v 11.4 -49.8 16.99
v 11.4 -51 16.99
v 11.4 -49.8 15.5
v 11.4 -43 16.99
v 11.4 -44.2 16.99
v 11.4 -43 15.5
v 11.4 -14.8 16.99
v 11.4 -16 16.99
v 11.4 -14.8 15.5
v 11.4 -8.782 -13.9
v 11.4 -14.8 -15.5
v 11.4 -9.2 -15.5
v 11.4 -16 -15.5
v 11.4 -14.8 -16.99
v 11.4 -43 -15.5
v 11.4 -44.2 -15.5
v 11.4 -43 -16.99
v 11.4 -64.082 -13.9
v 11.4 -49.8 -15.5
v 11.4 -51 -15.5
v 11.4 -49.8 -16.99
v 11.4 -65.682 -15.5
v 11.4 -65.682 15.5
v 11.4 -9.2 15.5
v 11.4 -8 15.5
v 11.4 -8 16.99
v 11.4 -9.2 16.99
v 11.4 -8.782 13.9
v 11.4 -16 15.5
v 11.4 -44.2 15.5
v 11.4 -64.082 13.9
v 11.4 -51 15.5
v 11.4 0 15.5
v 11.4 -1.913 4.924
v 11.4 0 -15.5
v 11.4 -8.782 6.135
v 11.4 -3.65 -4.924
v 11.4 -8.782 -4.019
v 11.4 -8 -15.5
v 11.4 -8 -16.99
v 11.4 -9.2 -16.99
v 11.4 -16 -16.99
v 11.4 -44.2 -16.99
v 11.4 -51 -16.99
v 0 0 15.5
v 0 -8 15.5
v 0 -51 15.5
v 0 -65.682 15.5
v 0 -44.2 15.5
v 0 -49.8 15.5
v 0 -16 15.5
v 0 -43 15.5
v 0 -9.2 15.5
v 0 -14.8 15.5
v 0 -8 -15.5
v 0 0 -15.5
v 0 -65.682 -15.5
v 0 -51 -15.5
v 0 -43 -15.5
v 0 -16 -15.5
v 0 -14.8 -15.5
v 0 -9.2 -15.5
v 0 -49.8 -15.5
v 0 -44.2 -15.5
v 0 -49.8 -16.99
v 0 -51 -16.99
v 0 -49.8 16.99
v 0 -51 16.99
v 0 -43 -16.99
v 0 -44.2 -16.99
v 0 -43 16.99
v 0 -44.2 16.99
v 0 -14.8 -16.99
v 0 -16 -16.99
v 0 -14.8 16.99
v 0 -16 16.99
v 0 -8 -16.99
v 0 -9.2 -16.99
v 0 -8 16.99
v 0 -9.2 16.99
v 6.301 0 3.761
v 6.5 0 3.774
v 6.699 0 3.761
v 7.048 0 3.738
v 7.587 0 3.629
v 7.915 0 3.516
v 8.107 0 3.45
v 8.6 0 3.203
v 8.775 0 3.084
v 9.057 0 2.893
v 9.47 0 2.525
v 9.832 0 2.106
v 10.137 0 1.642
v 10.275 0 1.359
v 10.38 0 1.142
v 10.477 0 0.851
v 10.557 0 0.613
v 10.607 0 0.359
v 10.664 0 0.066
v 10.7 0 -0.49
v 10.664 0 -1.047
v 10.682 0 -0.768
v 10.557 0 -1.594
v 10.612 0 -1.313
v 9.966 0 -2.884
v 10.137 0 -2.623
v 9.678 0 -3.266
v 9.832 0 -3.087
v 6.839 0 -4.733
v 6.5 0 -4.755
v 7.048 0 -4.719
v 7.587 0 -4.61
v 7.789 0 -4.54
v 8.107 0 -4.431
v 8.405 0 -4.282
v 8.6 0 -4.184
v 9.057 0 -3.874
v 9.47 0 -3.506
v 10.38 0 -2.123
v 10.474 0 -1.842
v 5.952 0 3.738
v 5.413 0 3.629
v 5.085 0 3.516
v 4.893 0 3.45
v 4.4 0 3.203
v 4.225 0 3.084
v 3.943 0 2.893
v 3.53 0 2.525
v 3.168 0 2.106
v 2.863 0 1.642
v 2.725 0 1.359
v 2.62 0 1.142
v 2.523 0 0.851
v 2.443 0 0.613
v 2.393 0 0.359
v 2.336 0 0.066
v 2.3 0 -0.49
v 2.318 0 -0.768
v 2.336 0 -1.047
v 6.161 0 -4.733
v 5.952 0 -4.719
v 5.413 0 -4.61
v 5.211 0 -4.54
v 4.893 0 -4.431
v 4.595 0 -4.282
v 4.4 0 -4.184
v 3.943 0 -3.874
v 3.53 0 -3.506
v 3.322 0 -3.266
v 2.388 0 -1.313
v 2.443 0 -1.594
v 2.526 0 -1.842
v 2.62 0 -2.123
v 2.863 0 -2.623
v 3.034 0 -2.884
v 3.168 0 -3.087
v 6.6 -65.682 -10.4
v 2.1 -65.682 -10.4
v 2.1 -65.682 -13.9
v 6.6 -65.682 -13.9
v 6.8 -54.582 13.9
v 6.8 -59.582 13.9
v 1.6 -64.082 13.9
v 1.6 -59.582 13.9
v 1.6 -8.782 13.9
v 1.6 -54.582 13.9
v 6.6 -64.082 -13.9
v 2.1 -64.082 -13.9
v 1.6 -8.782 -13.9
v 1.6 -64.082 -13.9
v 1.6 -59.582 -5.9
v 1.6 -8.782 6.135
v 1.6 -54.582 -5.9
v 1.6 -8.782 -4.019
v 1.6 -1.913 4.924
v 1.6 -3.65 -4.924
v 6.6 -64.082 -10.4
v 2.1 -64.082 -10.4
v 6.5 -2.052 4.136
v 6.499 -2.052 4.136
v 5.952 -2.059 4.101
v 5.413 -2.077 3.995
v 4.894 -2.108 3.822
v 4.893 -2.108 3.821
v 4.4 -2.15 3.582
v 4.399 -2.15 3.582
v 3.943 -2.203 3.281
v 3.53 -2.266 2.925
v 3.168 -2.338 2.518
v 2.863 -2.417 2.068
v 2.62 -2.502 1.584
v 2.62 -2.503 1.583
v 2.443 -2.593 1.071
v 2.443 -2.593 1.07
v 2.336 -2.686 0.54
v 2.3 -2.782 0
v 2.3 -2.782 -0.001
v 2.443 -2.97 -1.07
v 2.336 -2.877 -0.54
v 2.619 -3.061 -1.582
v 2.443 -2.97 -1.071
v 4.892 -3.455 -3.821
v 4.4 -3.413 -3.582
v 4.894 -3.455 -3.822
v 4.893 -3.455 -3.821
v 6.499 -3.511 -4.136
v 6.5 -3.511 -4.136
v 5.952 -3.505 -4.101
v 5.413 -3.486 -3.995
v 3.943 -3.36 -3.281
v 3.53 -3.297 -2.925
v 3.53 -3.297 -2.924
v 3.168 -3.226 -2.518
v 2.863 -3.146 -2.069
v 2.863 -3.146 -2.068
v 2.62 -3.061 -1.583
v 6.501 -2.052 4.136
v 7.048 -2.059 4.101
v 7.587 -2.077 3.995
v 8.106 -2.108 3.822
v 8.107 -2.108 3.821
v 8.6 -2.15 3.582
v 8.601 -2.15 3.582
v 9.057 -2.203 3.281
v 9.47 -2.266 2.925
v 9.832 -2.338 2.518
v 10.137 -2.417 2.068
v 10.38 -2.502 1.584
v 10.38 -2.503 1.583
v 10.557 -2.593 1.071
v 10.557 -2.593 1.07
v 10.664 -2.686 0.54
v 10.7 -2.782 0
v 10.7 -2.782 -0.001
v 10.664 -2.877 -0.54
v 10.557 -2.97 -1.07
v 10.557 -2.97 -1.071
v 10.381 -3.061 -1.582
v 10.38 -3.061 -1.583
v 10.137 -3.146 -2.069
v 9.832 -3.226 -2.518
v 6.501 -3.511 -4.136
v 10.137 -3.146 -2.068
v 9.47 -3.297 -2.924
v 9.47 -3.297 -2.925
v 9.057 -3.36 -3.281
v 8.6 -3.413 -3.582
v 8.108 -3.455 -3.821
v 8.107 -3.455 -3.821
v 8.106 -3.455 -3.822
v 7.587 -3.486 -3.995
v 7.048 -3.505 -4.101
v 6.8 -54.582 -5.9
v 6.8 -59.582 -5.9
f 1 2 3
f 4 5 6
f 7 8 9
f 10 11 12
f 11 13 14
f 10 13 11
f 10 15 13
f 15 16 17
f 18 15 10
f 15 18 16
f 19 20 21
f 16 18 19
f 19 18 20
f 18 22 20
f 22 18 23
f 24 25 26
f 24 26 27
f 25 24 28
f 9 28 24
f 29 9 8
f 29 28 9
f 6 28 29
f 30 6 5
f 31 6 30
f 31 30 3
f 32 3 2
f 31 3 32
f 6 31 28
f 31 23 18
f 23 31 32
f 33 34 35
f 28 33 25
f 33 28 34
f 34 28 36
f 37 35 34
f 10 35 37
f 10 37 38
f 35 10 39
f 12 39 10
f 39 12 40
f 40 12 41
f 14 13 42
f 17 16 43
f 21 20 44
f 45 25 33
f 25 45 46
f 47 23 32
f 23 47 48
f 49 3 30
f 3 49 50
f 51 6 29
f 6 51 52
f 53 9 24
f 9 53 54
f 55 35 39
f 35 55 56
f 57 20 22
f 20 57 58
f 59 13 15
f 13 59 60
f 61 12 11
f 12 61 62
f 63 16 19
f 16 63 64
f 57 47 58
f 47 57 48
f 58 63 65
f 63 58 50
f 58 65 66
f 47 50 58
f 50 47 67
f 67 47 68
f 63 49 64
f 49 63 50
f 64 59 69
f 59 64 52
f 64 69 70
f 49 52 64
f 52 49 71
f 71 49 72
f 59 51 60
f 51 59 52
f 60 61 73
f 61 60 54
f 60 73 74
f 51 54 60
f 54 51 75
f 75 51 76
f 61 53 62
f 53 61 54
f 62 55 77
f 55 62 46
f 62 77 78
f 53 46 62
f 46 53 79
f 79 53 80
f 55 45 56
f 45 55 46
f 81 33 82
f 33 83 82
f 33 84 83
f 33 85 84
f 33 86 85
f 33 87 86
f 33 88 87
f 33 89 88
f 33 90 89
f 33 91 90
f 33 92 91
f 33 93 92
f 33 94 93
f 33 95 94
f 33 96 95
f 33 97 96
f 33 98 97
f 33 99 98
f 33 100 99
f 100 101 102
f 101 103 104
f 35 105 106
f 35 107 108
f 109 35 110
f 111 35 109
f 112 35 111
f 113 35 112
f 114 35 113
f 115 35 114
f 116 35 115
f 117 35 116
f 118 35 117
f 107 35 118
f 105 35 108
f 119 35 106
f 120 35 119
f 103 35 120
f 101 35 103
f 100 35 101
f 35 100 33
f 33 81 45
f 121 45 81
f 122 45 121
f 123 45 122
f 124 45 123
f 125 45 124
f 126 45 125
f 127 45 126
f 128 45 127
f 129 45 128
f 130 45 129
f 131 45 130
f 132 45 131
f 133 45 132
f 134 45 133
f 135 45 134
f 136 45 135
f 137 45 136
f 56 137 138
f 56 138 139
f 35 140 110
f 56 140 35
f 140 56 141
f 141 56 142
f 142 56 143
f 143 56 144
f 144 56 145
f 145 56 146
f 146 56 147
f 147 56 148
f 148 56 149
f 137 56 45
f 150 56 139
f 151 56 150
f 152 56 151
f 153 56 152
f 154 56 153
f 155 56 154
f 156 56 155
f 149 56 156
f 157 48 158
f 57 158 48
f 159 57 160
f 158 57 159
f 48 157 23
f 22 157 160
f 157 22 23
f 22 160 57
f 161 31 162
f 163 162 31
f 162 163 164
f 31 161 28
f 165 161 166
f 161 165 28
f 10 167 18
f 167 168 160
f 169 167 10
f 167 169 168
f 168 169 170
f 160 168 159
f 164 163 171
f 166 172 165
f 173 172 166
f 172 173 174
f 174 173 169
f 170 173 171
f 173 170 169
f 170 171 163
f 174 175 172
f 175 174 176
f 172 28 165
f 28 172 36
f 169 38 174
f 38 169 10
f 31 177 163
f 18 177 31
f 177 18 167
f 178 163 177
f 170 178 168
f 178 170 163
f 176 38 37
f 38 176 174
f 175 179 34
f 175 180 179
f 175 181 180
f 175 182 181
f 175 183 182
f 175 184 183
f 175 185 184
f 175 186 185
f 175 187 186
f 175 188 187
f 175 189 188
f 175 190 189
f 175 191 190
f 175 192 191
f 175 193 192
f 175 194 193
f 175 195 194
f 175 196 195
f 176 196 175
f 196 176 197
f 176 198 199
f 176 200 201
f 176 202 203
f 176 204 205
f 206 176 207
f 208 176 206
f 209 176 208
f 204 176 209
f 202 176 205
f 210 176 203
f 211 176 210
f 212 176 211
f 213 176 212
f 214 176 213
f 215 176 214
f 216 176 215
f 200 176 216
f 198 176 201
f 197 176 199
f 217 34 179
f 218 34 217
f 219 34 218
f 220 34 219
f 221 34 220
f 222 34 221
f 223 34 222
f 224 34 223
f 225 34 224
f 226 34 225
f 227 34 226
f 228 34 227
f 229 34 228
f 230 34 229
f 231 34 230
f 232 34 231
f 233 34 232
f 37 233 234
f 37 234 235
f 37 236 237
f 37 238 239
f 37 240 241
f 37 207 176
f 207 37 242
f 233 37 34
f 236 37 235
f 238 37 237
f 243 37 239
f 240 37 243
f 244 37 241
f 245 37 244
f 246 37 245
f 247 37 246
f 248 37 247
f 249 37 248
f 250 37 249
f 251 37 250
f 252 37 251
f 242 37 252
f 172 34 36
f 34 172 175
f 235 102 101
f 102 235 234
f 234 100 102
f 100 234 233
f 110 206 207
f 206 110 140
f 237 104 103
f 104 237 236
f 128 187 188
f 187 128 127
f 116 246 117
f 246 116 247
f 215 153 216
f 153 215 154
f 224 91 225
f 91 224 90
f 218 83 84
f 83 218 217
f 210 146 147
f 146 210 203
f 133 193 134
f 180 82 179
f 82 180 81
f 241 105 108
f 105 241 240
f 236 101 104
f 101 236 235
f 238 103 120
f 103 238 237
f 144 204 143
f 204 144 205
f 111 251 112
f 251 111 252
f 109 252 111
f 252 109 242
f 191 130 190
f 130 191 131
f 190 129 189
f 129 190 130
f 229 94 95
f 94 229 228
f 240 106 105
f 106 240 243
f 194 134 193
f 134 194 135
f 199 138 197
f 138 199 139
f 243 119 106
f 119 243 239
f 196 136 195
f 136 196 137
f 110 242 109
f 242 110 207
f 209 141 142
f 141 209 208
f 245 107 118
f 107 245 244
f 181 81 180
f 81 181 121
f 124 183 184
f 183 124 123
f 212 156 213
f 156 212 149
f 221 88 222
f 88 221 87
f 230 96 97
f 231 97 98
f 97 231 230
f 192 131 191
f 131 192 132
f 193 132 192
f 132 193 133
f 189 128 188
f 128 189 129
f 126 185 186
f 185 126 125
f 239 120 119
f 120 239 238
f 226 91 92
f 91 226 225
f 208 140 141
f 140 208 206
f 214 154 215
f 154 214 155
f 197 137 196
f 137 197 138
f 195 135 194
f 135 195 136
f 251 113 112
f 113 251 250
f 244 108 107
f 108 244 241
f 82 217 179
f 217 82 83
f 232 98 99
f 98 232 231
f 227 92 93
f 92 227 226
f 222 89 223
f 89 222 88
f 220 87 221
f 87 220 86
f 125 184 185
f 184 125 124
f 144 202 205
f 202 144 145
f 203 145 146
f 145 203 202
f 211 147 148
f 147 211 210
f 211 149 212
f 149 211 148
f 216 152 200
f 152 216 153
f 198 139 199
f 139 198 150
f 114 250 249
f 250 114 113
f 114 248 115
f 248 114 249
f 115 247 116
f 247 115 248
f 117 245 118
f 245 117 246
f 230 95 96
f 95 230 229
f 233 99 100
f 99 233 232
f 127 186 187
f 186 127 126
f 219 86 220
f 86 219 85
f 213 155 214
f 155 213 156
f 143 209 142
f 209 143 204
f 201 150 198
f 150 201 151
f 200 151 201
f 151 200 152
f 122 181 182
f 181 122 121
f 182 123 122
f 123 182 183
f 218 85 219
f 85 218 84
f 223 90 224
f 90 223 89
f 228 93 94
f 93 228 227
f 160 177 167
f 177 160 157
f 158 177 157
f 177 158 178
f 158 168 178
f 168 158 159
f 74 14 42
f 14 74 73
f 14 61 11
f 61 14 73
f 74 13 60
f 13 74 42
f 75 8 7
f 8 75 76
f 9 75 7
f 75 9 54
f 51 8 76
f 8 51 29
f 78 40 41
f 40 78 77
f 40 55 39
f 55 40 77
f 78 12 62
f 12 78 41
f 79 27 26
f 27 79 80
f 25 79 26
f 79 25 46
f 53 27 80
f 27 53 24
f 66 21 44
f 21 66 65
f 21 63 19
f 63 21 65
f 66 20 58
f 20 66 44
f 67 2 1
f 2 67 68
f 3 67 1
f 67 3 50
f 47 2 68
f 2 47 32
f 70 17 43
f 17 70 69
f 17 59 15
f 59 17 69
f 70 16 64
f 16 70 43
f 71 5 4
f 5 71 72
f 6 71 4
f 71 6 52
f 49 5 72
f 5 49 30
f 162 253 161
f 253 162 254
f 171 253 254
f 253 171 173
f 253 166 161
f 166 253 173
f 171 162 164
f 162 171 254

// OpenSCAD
// OpenVision – clip-on USB camera mount for ordinary eyeglasses
// ---------------------------------------------------------------
// Parametric OpenSCAD model. Measure YOUR glasses' temple arm and YOUR camera,
// edit the numbers below, press F6, then File → Export → STL.
//
// Two camera styles are supported:
//   cam_type = "board" : square UVC camera board (e.g. 32×32 mm or 38×38 mm modules
//                        with an M12 lens, or small 15–25 mm boards). The board sits
//                        in a pod with a lens hole; a snap-in back lid holds it.
//   cam_type = "tube"  : cylindrical "endoscope / borescope" head (5.5 / 7 / 8 mm).
//                        Lightest option. Held in a split collar, clamped with a zip-tie.
//   cam_type = "esp32cam" : AI-Thinker ESP32-CAM (Wi-Fi, see firmware/openvision_cam). Default
//                        mount_style = "strap": no measuring, fits almost any glasses. The board lies
//                        flat against the arm in a slim box; the OV2640 camera is bent forward on
//                        its ribbon into a tilted seat behind the lens hole; a 6×6 mm push button
//                        pokes through the side lid at the back (press toward your head).
//                        strap style: two zip-ties/O-rings round box + arm also hold the lid.
//                        clip style: two snap clips (front + rear), lid glued or taped on.
//
// The mount slides onto the temple arm right behind the hinge, on the OUTSIDE.
// It snaps on (C-shaped clip with retaining lips) and can be secured with a thin
// zip-tie through the slot. The camera points forward and slightly down (tilt).
//
// Axes: +Y = forward (where you look), +Z = up, +X = away from your head (right side).
// Set side = "left" to mirror for the left temple.
//
// Print: PETG (flexes without cracking; PLA clips snap). 0.2 mm layers, 3 walls, 30 % infill.
// The "mount" part prints with the pod's outer side on the bed (already oriented by part="mount").
// The lid prints flat, lip up. No supports needed for the clip; the lens hole bridges fine.
// esp32cam: part="mount" prints upside down (box top on the bed); the 45° fillets above the clips
// make it support-free. Cut the ESP32-CAM's header pins before fitting it (program it first).

/* [What to render] */
part = "preview";        // [preview, mount, lid, cable_clip]
side = "right";          // [right, left]
cam_type = "esp32cam";   // [board, tube, esp32cam]

/* [Camera preset – modules sold in Iran (checked 2026-11). "custom" uses the Board numbers below.] */
// ov2710_38  : Aftab Rayaneh RER-USBFHD01, OV2710 1080p UVC, 38×38 mm PCB, M12 lens
//              (pick the 2.4 mm or 3.6 mm lens). The M12 holder's square base goes through
//              the front wall; the lens then screws in from the front to set focus.
// xh57_strip : Aftab Rayaneh 1 MP XH57 "laptop-webcam" strip, 35×12×4.9 mm, 71° FOV,
//              focus 15–150 cm. Lightest board option; mounted long side vertical.
// Still MEASURE your module (calipers) and check: hole spacing, holder size, lens position.
preset = "custom";       // [custom, ov2710_38, xh57_strip]
pod_dz = 0;              // move the camera pod up (+) / down (−) relative to the arm, mm

/* [Temple arm of your glasses – measure with calipers 1–2 cm behind the hinge] */
temple_t   = 3.0;   // thickness (side to side), mm
temple_h   = 6.0;   // height (top to bottom), mm
fit_tol    = 0.25;  // clearance per side; raise to 0.35 if too tight
clip_len   = 18;    // length along the arm
clip_wall  = 1.6;
lip        = 0.9;   // retaining lip under the arm (bigger = holds tighter, harder to snap on)

/* [Board camera] */
board_w    = 32;    // PCB width  (X in the pod)
board_h    = 32;    // PCB height (Z)
board_t    = 1.6;   // PCB thickness
back_space = 7;     // room behind the PCB for connector + cable bend
lens_d     = 14;    // lens barrel / holder diameter that goes through the front
lens_hole  = "round"; // [round, square]  square = for an M12 lens holder's square base
lens_sq    = 15.5;  // side of the square hole (measure the holder base, add ~0.5)
lens_dx    = 0;     // lens offset from PCB centre
lens_dz    = 0;
hole_sp_x  = 28;    // mounting-hole spacing (0 = no holes)
hole_sp_z  = 28;
hole_d     = 2.3;   // M2 clearance
pod_wall   = 1.6;
cable_w    = 4.5;   // cable slot width in the lid

/* [Tube camera] */
tube_d     = 8.0;   // head diameter
tube_len   = 14;    // how much of the head the collar grips

/* [ESP32-CAM box (cam_type = esp32cam)] */
esp_l      = 40.5;  // board length (lies along the arm, camera end forward, antenna end back)
esp_h      = 27.0;  // board height
// Defaults come from the Ai-Thinker datasheet (27 × 40.5 × 4.5 mm ±0.2) – no calipers needed.
esp_stack  = 6.5;   // 4.5 mm board + ~1 mm cut pin stubs + 1 mm foam
cam_sq     = 9.0;   // OV2640 camera module (≈8–8.5 mm; seat is generous, the module is glued)
cam_room   = 6;     // chamber in front of the board for the camera + ribbon bend
cam_dz     = 0;     // camera height relative to the box centre
esp_lens_d = 8.0;   // lens hole (OV2640 barrel ≈ 6–7.5 mm; the module is glued behind it)
btn_sq     = 6.2;   // 6×6 mm tactile switch
btn_h      = 7.0;   // switch height incl. plunger (buy 6×6×7 mm or taller)
btn_out    = 1.0;   // how far the plunger sticks out of the lid
btn_hole   = 4.0;   // hole in the lid for the plunger
btn_z      = 2;     // button height relative to the box centre
btn_room   = 14;    // chamber behind the board: button, cable strain relief, 6.3×11 mm capacitor
rear_clip  = true;  // second clip at the back end of the box
// How the box holds onto the glasses:
//   "strap": NO measuring. Two zip-ties (or silicone bands) wrap round the box AND the temple arm,
//            guided by fins on the box's top and bottom. Fits arms ~1.5–8 mm thick, 2–15 mm tall.
//            The straps also hold the lid on. Prints flat, open side up.
//   "clip" : snap-on clips sized to temple_t / temple_h (needs the arm measured).
mount_style = "strap";  // [strap, clip]
strap_w    = 5.0;   // guide gap: fits 2.5–4.8 mm zip-ties (incl. reusable ones) or a 3 mm silicone O-ring
strap_1    = 12;    // first strap, distance from the front of the box (behind the camera)
strap_2    = 47;    // second strap (in front of the button)
fin_h      = 1.5;   // guide fin height
lid_vents  = true;  // slots over the board – put the ESP32 shield side toward the lid (away from your head)

/* [Cable clips – hold the power cable along the arm, behind the ear (part = cable_clip, print 3–4)] */
cc_t       = 3.0;   // arm thickness where the clip goes (often thicker behind the ear – measure)
cc_h       = 6.0;   // arm height there
cc_len     = 6;     // clip length along the arm
cc_cable_d = 3.5;   // cable diameter

/* [Aim] */
tilt       = 10;    // degrees the camera points down (you look slightly down when walking/reading)
toe_out    = 0;     // degrees the camera turns outward (positive = away from nose)

$fn = 48;
eps = 0.01;

// preset → effective board numbers (OpenSCAD can't reassign, so presets pick values here)
P1 = preset == "ov2710_38";
P2 = preset == "xh57_strip";
bw  = P1 ? 38  : P2 ? 12  : board_w;
bh  = P1 ? 38  : P2 ? 35  : board_h;
bt  = P1 ? 1.6 : P2 ? 4.9 : board_t;
bs  = P1 ? 7   : P2 ? 3   : back_space;   // OV2710: USB header on the back; strip: soldered cable
lh  = P1 ? "square" : lens_hole;
lsq = P1 ? 15.5 : lens_sq;                // typical M12 holder base 15 mm – measure yours
ld  = P2 ? 7 : lens_d;                    // strip: small window in front of the tiny lens
ldx = lens_dx;                            // lens offset from the board centre – applies to presets too
ldz = lens_dz;                            // (strip: measure where the lens sits on YOUR module)
hsx = (P1 || P2) ? 0 : hole_sp_x;         // presets: no screws, the lid presses the board in place
hsz = (P1 || P2) ? 0 : hole_sp_z;
// With no screw holes, the lid's lip is made deep enough to press the board against the front wall.
lip_d = (hsx > 0) ? 2.2 : max(2.2, bs - 0.3);
cam_type_eff = (P1 || P2) ? "board" : cam_type;
if (P1) echo("OV2710 board: ~15 g with M12 lens. Put the mount on the arm close to the hinge; consider a counterweight on the other arm.");
if (P2) echo("XH57 strip: check where the lens sits on YOUR module and set lens_dz / pod_dz.");

// derived
tt = temple_t + 2 * fit_tol;            // slot width
th = temple_h + 2 * fit_tol;            // slot height
clip_out_x = tt + clip_wall;            // outer face of the clip
pw = bw + 0.4 + 2 * pod_wall;           // pod outer width
ph = bh + 0.4 + 2 * pod_wall;           // pod outer height
pd = pod_wall + bt + bs;                // pod outer depth

// ---------------- temple clip ----------------
// C-profile open at the bottom, extruded along Y from -clip_len to 0.
module clip(ziptie = true) {
  difference() {
    translate([-clip_wall, -clip_len, -clip_wall])
      cube([tt + 2 * clip_wall, clip_len, th + 2 * clip_wall]);
    // slot for the arm
    translate([0, -clip_len - 1, 0]) cube([tt, clip_len + 2, th]);
    // bottom opening, leaving a lip on each side
    translate([lip, -clip_len - 1, -clip_wall - 1]) cube([tt - 2 * lip, clip_len + 2, clip_wall + 2]);
    // zip-tie slot through the top, across the arm
    if (ziptie) translate([-clip_wall - 1, -clip_len * 0.65, th + clip_wall - 0.9]) cube([tt + 2 * clip_wall + 2, 3, 2]);
  }
}

// ---------------- board pod ----------------
// Local frame: front face at y = 0, pod spans x 0..pw, centred on z = 0. Open at the back.
module board_pod() {
  translate([0, -pd, -ph / 2]) difference() {
    cube([pw, pd, ph]);
    // cavity for PCB + parts behind it
    translate([pod_wall, -eps, pod_wall]) cube([pw - 2 * pod_wall, pd - pod_wall + eps, ph - 2 * pod_wall]);
    // lens hole through the front wall (round for a barrel, square for an M12 holder base)
    translate([pw / 2 + ldx, pd - pod_wall - 1, ph / 2 + ldz])
      if (lh == "square") translate([-lsq / 2, 0, -lsq / 2]) cube([lsq, pod_wall + 2, lsq]);
      else rotate([-90, 0, 0]) cylinder(d = ld + 0.4, h = pod_wall + 2);
    // M2 holes for screws from the front (nuts behind the PCB), if the board has holes
    if (hsx > 0)
      for (sx = [-1, 1], sz = [-1, 1])
        translate([pw / 2 + sx * hsx / 2, pd - pod_wall - 1, ph / 2 + sz * hsz / 2])
          rotate([-90, 0, 0]) cylinder(d = hole_d, h = pod_wall + 2);
  }
}

// Snap-in back lid: plate + inner lip that friction-fits the cavity, with a cable slot.
module board_lid() {
  cw = pw - 2 * pod_wall - 0.3;
  ch = ph - 2 * pod_wall - 0.3;
  difference() {
    union() {
      cube([pw, ph, 1.4]);                                              // plate (prints flat)
      translate([(pw - cw) / 2, (ph - ch) / 2, 1.4]) difference() {     // lip ring
        cube([cw, ch, lip_d]);
        translate([1.2, 1.2, -eps]) cube([cw - 2.4, ch - 2.4, lip_d + 2 * eps]);
      }
    }
    // cable slot from the centre to the bottom edge, so the lid goes on over the cable
    translate([pw / 2 - cable_w / 2, -1, -1]) cube([cable_w, ph / 2 + 1, 10]);
  }
}

// ---------------- tube collar ----------------
// Split ring around the camera head, clamped with a 2.5 mm zip-tie. Local frame like the pod.
module tube_pod() {
  od = tube_d + 2 * 1.8;
  translate([od / 2, 0, 0]) difference() {
    union() {
      rotate([90, 0, 0]) cylinder(d = od, h = tube_len);
      translate([-od / 2, -tube_len, -od / 2]) cube([od / 2, tube_len, od]);   // flat side to join the clip
    }
    translate([0, 1, 0]) rotate([90, 0, 0]) cylinder(d = tube_d + 0.3, h = tube_len + 2);
    translate([-0.6, -tube_len - 1, 0]) cube([1.2, tube_len + 2, od]);         // split, top
    translate([-od, -tube_len / 2 - 1.5, -od]) difference() {                  // zip-tie groove
      cube([2 * od, 3, 2 * od]);
      translate([od, -1, od]) rotate([-90, 0, 0]) cylinder(d = od - 1.2, h = 5);
    }
  }
}

// ---------------- ESP32-CAM box ----------------
// Local frame like the pods: front face at y = 0, inner wall (against the clip) at x = 0,
// open on the outer side (+X, closed by esp_lid), centred on z = 0.
eix = max(esp_stack, cam_sq + 0.4) + 0.4;                  // inner thickness (X)
eiz = esp_h + 0.8;                                          // inner height (board ±0.2 + print tolerance)
e_front = pod_wall + (cam_sq / 2 + 0.5) * tan(tilt) + 0.3;  // front wall, thick enough for the tilted seat
eiy = cam_room + esp_l + 0.8 + btn_room;                    // inner length
ex = pod_wall + eix;
ey = e_front + eiy + pod_wall;
ez = eiz + 2 * pod_wall;
btn_y = -(ey - pod_wall - btn_room / 2);                    // button centre (local y)
main_y0 = -(ey - pod_wall);                                 // main cavity: back inner wall …
main_y1 = -(e_front + cam_room);                            // … to the camera bulkhead
esp_lip = 0.8;

// camera seat frame: origin on the inner face of the front wall, +Y = viewing direction (tilted down/out)
module cam_frame() {
  translate([pod_wall + eix / 2, -e_front, cam_dz]) rotate([0, 0, -toe_out]) rotate([-tilt, 0, 0]) children();
}

btn_seat = ex + 1.4 + btn_out - btn_h;   // x of the switch's back face (it rests on a block)

module esp_box() {
  difference() {
    translate([0, -ey, -ez / 2]) cube([ex, ey, ez]);
    // board + button chamber, open to the outside
    translate([pod_wall, main_y0, -eiz / 2]) cube([eix + 1, main_y1 - main_y0, eiz]);
    // tilted camera chamber (the module is glued against its front face), open to the outside
    cam_frame() translate([-eix / 2, -(cam_room + 3), -(cam_sq + 1) / 2]) cube([eix + 2, cam_room + 3, cam_sq + 1]);
    // lens hole
    cam_frame() translate([0, -eps, 0]) rotate([-90, 0, 0]) cylinder(d = esp_lens_d + 0.4, h = e_front + 3);
    // cable exit at the back, bottom (5V + GND to the phone / power bank). Strain relief: a small
    // zip-tie pulled tight round the cable just inside the box can't pass this 3.5 mm slot.
    translate([pod_wall + 0.5, -ey - 1, -eiz / 2]) cube([cable_w, pod_wall + 2, 3.5]);
  }
  // block the switch rests on (hangs from the top wall). Leaves an 8 mm channel at the bottom for the
  // cable + the 6.3×11 mm capacitor. 5 mm wide so the switch legs pass beside it (bend them flat).
  if (btn_seat > pod_wall)
    translate([pod_wall - eps, btn_y - 2.5, -eiz / 2 + 8]) cube([btn_seat - pod_wall + eps, 5, eiz - 8 + eps]);
  // strap guides: pairs of fins across the top and bottom faces
  if (mount_style == "strap")
    for (sy = [strap_1, strap_2], side_ = [-1, 1], zs = [-1, 1])
      translate([0, -sy + side_ * (strap_w / 2 + 0.3) - (side_ < 0 ? 1.2 : 0), zs > 0 ? ez / 2 - eps : -ez / 2 - fin_h + eps])
        cube([ex, 1.2, fin_h]);
}

// Side lid: flat plate + shallow locating rim. Prints flat. Fix with two dots of hot glue or a band of tape.
// Lid x = distance from the back of the box, lid y = distance from the TOP of the box.
module esp_lid() {
  cl = main_y1 - main_y0 - 0.3;
  ch = eiz - 0.3;
  difference() {
    union() {
      cube([ey, ez, 1.4]);
      translate([pod_wall + 0.15, pod_wall + 0.15, 1.4]) difference() {
        cube([cl, ch, esp_lip]);
        translate([1.0, 1.0, -eps]) cube([cl - 2.0, ch - 2.0, esp_lip + 2 * eps]);
      }
    }
    translate([btn_y + ey, ez / 2 - btn_z, -1]) cylinder(d = btn_hole, h = 5);   // button plunger
    // vent slots over the board (the ESP32 runs warm; keep the heat away from your temple)
    if (lid_vents)
      for (i = [0 : 3])   // 4 slots between the two straps (lid x is measured from the BACK of the box)
        translate([ey - (strap_1 + 4 + i * (strap_2 - strap_1 - 8) / 3) - 0.7, ez / 2 - 8, -1]) cube([1.4, 16, 5]);
  }
}

// ---------------- cable clip ----------------
// Snaps onto the arm like the main clip; the cable clicks into a ring on the outer side.
module cable_clip() {
  t2 = cc_t + 2 * fit_tol;
  h2 = cc_h + 2 * fit_tol;
  rc = t2 + clip_wall + cc_cable_d / 2 + 0.6;   // ring centre (x)
  difference() {
    union() {
      translate([-clip_wall, 0, -clip_wall]) cube([t2 + 2 * clip_wall, cc_len, h2 + 2 * clip_wall]);
      translate([rc, 0, h2 / 2]) rotate([-90, 0, 0]) cylinder(d = cc_cable_d + 2.4, h = cc_len);
    }
    translate([0, -1, 0]) cube([t2, cc_len + 2, h2]);                                   // arm slot
    translate([lip, -1, -clip_wall - 1]) cube([t2 - 2 * lip, cc_len + 2, clip_wall + 2]); // snap opening
    translate([rc, -1, h2 / 2]) rotate([-90, 0, 0]) cylinder(d = cc_cable_d + 0.3, h = cc_len + 2);
    translate([rc, -1, h2 / 2 - cc_cable_d * 0.35]) cube([cc_cable_d + 3, cc_len + 2, cc_cable_d * 0.7]); // cable snaps in
  }
}

module esp_mount() {
  bx = clip_out_x - 0.6;
  bz = th / 2 + pod_dz;
  clip(false);
  if (rear_clip) translate([0, -(ey - clip_len), 0]) clip(false);
  translate([bx, 0, bz]) esp_box();
  // 45° fillets on top of the clips: tie them into the box and let the part print upside down without supports
  wh = max(0, min(bx + clip_wall, bz + ez / 2 - (th + clip_wall)));
  for (y0 = rear_clip ? [0, -(ey - clip_len)] : [0])
    translate([0, y0, 0]) rotate([90, 0, 0]) linear_extrude(clip_len)
      polygon([[-clip_wall, th + clip_wall], [bx + eps, th + clip_wall], [bx + eps, th + clip_wall + wh]]);
}
esp_top = th / 2 + pod_dz + ez / 2;   // highest point when worn

// ---------------- assembly ----------------
module camera_body() { if (cam_type_eff == "board") board_pod(); else tube_pod(); }
pod_w = (cam_type_eff == "board") ? pw : tube_d + 3.6;
pod_len = cam_type_eff == "board" ? pd : tube_len;

module mount() {
  clip();
  // Pod hangs on the outer face of the clip, front-aligned, centred on the arm (+pod_dz), aimed down/out.
  translate([clip_out_x - 0.6, 0, th / 2 + pod_dz])
    rotate([0, 0, -toe_out]) rotate([-tilt, 0, 0]) camera_body();
  // gusset that ties the pod's inner side into the clip along its whole length
  hull() {
    translate([clip_out_x - 0.6, -clip_len, -clip_wall]) cube([0.6, clip_len, th + 2 * clip_wall]);
    translate([clip_out_x - 0.6, 0, th / 2 + pod_dz]) rotate([0, 0, -toe_out]) rotate([-tilt, 0, 0])
      translate([0, -min(clip_len, pod_len), -(th + 2 * clip_wall) / 2])
        cube([1.2, min(clip_len, pod_len), th + 2 * clip_wall]);
  }
}

module sided() { if (side == "left") mirror([1, 0, 0]) children(); else children(); }

if (part == "mount") {
  if (cam_type_eff == "esp32cam") {
    if (mount_style == "strap")
      // Inner face (against the arm) flat on the bed, open side up – a simple tray, no supports.
      rotate([0, -90, 0]) { if (side == "left") mirror([0, 1, 0]) esp_box(); else esp_box(); }
    else
      // Upside down: box top on the bed, clip slots open upward, fillets carry the clips. No supports.
      sided() translate([0, 0, esp_top]) rotate([0, 180, 0]) esp_mount();
  } else {
    // Outer side of the pod down on the bed (flat as long as toe_out = 0).
    sided() rotate([0, 90, 0]) translate([-(clip_out_x - 0.6 + pod_w), 0, 0]) mount();
  }
} else if (part == "cable_clip") {
  rotate([90, 0, 0]) cable_clip();   // stands on its end: profile in the layers, no overhangs
} else if (part == "lid") {
  if (cam_type_eff == "board") board_lid();
  else if (cam_type_eff == "esp32cam") {
    // the lid isn't symmetric (button hole, rim), so the left-side lid is the mirror image
    if (side == "left") translate([ey, 0, 0]) mirror([1, 0, 0]) esp_lid(); else esp_lid();
  }
  else echo("Tube camera has no lid.");
} else {
  sided() {
    if (cam_type_eff == "esp32cam") {
      bxo = mount_style == "strap" ? [0, 0, 0] : [clip_out_x - 0.6, 0, th / 2 + pod_dz];
      if (mount_style == "strap") {
        esp_box();
        // ghost temple arm against the inner face, and the two straps round box + arm
        %translate([-temple_t - 1, -80, -temple_h / 2]) cube([temple_t, 100, temple_h]);
        for (sy = [strap_1, strap_2])
          %translate([-temple_t - 1.6, -sy - strap_w / 2, -ez / 2 - 0.6]) difference() {
            cube([temple_t + 1.6 + ex + 1.4 + 0.6, strap_w, ez + 1.2]);
            translate([0.6, -1, 0.6]) cube([temple_t + 1.6 + ex + 1.4 - 0.6, strap_w + 2, ez]);
          }
      } else esp_mount();
      // ghost of the lid in place (lid x → box −y from the back, lid z → inward)
      %translate(bxo)
        multmatrix([[0, 0, -1, ex + 1.4], [1, 0, 0, -ey], [0, -1, 0, ez / 2], [0, 0, 0, 1]]) esp_lid();
    } else mount();
    // ghost of the temple arm, for checking the fit
    %translate([fit_tol, -60, fit_tol]) cube([temple_t, 80, temple_h]);
    if (cam_type_eff == "board")
      %translate([clip_out_x + pw + 8, -pd, -ph / 2 + th / 2]) rotate([90, 0, 0]) translate([0, 0, -1.4]) board_lid();
  }
}
